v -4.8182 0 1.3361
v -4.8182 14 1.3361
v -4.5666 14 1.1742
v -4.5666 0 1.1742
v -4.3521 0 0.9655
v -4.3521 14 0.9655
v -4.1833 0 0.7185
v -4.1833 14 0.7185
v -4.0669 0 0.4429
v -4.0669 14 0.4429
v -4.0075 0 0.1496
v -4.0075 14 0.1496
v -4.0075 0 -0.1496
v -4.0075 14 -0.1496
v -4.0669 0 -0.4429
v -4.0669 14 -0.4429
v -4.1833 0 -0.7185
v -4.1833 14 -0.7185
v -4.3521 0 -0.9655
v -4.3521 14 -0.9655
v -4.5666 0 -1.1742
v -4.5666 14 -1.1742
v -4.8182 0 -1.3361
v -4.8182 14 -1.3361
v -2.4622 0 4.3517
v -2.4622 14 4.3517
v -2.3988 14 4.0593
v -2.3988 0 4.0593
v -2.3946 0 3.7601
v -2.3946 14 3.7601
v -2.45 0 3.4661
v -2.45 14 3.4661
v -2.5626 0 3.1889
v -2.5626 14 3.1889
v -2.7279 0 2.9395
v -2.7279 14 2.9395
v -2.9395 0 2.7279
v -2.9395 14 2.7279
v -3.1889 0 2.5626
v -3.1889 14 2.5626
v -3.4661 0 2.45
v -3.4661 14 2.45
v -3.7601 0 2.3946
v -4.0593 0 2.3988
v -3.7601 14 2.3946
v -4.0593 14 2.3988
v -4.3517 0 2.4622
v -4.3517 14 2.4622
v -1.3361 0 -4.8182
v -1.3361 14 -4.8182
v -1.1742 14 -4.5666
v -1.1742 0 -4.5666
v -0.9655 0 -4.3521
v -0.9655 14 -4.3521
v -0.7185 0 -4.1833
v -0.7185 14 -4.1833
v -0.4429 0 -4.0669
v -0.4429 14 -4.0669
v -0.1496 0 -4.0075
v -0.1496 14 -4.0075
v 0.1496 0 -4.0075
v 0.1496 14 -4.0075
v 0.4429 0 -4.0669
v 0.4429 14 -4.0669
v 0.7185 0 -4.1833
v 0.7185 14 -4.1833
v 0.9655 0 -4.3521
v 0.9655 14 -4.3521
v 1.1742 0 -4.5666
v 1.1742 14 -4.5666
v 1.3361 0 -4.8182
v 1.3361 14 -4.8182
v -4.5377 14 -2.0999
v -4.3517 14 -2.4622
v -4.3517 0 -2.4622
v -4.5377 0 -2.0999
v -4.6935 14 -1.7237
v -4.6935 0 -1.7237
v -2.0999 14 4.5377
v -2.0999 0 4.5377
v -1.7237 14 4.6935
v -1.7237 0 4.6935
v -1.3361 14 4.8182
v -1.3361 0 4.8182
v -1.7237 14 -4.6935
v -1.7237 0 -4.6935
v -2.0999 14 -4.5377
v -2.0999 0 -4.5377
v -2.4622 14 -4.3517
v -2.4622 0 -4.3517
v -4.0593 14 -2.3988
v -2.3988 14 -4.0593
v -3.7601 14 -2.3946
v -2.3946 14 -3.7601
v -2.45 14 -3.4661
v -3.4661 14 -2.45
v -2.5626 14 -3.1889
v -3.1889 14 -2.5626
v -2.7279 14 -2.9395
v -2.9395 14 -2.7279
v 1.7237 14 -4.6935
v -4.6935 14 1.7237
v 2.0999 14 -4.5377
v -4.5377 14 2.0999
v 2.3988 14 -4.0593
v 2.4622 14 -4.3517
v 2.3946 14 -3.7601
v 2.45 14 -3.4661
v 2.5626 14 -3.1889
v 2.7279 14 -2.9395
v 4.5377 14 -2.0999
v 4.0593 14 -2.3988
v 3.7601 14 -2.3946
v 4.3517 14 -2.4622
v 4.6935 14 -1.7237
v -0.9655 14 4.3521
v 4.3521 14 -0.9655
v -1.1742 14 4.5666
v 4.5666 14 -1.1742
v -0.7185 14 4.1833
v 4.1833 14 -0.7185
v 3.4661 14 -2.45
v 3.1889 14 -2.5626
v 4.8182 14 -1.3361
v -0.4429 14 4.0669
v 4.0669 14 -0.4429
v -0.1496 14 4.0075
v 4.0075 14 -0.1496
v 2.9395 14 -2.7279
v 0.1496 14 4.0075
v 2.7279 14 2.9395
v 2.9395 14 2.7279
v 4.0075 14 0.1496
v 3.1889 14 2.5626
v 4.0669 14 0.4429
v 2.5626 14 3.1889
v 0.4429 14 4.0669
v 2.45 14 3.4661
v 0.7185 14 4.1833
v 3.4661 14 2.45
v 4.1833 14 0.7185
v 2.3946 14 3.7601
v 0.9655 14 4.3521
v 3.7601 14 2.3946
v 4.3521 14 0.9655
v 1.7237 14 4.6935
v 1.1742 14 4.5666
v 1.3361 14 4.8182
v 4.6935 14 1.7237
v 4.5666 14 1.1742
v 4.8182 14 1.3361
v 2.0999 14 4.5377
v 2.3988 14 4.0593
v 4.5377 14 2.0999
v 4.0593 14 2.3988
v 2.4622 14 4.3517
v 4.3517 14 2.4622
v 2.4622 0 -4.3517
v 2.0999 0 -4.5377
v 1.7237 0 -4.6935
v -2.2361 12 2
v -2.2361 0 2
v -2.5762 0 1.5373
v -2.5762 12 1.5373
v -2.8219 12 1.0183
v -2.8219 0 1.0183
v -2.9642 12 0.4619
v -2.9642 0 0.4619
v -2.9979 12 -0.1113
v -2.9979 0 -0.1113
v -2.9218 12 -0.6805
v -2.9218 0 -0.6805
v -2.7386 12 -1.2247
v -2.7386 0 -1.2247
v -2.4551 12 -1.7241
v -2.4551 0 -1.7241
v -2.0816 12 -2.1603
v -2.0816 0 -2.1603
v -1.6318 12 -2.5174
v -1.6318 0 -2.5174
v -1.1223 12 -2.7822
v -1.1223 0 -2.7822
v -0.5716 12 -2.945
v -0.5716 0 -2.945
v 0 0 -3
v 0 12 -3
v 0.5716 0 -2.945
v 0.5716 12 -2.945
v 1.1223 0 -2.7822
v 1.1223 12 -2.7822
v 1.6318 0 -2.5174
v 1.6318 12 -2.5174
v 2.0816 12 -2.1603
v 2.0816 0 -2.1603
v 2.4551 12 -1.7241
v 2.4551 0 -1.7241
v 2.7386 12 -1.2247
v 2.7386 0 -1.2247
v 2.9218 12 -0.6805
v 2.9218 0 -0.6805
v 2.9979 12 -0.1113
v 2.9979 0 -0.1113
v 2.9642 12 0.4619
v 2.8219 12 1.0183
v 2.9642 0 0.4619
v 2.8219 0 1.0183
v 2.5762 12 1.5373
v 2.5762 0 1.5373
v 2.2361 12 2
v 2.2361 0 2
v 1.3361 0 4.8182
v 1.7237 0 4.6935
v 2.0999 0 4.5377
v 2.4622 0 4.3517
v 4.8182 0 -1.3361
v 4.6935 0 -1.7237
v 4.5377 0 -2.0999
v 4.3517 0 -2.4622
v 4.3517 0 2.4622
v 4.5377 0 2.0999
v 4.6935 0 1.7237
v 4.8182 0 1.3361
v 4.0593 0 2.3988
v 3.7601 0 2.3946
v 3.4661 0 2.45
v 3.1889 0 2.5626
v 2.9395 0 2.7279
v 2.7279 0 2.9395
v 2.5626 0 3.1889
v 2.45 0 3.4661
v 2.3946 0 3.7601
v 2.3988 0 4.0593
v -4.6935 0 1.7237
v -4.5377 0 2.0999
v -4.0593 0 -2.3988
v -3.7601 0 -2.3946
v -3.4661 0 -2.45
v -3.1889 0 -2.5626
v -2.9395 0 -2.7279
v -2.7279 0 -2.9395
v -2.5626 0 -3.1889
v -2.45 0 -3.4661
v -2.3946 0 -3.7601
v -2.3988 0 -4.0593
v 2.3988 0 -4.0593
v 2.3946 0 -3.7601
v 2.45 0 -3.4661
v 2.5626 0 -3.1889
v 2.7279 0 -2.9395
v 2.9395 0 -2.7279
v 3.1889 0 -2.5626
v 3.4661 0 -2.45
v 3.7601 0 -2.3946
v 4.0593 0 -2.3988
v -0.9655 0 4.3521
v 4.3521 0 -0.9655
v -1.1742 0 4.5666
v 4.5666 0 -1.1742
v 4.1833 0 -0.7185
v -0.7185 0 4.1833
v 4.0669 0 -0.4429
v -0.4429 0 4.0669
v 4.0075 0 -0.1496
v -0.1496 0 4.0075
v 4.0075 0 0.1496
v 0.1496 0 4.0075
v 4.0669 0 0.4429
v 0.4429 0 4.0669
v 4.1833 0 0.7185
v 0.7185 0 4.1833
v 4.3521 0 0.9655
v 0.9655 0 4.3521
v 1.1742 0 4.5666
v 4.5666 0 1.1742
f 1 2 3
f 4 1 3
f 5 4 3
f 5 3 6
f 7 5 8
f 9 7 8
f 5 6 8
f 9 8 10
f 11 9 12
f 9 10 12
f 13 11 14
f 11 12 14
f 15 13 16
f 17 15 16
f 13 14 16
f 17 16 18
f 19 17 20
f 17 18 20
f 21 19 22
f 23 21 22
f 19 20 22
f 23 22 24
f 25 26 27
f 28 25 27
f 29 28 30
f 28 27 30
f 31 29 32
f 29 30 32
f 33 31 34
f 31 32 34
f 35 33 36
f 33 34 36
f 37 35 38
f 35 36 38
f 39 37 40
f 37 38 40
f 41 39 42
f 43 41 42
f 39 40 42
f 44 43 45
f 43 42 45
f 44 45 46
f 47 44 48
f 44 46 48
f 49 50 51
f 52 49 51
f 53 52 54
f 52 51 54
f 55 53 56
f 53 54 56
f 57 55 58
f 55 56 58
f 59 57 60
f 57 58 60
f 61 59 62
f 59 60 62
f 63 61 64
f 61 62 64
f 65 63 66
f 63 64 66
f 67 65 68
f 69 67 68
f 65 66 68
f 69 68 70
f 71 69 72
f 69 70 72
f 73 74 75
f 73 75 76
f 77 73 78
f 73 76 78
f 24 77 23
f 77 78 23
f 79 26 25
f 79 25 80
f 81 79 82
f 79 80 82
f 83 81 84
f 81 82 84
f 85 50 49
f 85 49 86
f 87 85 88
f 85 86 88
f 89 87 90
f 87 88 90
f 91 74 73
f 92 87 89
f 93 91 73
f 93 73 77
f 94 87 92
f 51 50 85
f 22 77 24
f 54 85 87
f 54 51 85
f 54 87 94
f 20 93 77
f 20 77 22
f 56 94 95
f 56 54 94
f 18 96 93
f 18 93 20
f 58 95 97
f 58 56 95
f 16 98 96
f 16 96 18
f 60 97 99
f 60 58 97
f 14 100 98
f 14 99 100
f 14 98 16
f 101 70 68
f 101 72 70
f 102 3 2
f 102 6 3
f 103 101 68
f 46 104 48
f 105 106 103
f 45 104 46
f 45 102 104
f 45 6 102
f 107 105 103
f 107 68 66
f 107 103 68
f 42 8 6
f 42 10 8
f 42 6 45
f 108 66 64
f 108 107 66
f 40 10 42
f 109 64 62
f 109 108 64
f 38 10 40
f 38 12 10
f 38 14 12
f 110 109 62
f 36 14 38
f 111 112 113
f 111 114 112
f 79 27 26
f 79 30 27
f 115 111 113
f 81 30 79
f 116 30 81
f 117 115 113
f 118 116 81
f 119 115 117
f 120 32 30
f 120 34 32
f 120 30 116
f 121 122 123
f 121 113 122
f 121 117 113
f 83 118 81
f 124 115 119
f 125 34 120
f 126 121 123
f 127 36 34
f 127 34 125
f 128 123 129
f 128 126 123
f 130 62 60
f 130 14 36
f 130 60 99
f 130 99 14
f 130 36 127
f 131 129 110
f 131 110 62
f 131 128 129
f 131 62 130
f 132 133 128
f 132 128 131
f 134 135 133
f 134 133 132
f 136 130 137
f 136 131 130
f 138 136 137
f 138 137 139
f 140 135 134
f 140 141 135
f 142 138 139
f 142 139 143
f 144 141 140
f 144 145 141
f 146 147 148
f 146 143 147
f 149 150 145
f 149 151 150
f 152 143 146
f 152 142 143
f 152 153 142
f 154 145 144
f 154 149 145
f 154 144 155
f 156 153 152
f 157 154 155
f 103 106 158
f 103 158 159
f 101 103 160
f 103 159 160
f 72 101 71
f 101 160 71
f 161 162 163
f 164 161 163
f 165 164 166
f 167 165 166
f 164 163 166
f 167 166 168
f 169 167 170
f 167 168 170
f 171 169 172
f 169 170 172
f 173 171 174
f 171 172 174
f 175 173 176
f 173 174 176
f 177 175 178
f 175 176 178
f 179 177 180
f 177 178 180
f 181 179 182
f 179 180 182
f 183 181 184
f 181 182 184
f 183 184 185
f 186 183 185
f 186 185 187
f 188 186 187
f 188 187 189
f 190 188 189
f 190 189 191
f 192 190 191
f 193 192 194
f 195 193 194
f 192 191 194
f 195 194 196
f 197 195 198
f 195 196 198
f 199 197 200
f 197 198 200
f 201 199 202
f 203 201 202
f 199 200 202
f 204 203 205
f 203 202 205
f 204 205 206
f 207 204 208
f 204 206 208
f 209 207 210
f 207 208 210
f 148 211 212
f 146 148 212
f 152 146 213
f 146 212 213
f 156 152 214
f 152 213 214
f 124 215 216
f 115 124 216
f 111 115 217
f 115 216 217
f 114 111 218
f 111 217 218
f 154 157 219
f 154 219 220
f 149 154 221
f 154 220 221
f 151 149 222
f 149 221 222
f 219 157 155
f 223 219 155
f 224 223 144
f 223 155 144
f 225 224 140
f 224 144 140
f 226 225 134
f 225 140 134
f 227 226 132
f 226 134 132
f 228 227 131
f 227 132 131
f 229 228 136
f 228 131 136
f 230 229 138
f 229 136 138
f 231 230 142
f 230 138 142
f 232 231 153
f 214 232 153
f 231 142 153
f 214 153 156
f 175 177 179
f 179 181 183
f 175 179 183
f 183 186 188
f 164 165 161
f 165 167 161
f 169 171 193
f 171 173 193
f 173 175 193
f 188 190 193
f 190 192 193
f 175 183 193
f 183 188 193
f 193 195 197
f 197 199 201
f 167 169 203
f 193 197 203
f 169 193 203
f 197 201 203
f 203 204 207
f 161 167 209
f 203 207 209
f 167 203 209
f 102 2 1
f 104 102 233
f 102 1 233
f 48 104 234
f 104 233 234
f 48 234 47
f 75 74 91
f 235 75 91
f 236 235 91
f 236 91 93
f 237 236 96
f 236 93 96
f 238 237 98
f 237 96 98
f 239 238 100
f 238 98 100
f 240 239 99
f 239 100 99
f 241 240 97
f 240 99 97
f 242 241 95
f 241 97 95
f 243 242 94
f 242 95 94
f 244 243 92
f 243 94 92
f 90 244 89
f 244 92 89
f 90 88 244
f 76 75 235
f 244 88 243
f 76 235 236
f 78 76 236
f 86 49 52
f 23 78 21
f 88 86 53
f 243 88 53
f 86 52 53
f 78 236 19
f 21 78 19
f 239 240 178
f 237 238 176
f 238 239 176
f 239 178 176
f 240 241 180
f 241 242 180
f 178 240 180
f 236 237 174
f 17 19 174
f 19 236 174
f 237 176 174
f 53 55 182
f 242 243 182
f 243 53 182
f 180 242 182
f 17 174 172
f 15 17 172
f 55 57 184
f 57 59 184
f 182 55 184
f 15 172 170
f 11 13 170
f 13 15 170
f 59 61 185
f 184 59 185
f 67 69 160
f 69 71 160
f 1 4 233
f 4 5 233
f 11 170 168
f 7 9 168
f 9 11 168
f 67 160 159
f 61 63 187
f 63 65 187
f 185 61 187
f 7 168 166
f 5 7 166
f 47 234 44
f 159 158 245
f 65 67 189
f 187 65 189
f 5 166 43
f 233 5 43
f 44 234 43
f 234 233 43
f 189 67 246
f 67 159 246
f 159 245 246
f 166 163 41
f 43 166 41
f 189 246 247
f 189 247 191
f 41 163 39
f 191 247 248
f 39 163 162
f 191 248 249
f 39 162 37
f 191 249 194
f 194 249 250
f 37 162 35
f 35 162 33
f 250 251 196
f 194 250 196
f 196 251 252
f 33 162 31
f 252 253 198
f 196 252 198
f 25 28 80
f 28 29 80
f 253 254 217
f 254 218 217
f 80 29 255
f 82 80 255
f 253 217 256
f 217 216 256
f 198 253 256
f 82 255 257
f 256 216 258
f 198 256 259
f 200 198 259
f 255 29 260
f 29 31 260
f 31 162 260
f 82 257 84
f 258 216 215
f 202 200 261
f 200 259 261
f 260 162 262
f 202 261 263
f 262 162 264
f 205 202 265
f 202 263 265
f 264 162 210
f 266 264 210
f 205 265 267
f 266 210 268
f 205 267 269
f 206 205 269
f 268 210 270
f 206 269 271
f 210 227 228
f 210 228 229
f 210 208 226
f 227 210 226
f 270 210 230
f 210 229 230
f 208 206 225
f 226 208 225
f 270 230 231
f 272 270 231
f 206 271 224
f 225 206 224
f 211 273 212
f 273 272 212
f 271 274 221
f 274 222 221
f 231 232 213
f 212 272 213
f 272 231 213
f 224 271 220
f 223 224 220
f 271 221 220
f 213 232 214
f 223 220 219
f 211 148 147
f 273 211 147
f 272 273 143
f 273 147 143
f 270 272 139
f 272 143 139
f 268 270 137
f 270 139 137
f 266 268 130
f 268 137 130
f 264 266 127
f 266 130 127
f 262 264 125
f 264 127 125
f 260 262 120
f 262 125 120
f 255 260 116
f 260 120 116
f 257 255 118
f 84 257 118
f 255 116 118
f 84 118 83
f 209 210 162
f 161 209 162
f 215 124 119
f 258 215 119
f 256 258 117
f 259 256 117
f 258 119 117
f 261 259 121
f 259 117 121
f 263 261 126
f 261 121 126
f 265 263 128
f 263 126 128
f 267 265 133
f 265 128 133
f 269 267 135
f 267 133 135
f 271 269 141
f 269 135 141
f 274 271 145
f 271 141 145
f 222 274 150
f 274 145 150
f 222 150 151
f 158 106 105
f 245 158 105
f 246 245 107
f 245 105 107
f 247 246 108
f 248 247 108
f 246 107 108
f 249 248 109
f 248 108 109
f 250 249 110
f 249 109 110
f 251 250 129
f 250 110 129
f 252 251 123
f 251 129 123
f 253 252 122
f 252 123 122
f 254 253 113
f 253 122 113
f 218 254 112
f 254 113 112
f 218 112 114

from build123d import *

# Parameters (mm, degrees)
ESQUISSE1_R                  = 5
BOSS_EXTRU_1_DEPTH           = 12
ESQUISSE2_R                  = 5
BOSS_EXTRU_2_DEPTH           = 2
ESQUISSE3_R                  = 1.5
ENL_V_MAT_EXTRU_1_DEPTH      = 14
R_P_TITION_CIRCULAIRE1_COUNT = 8


with BuildPart() as part:
    # Esquisse1 → Boss.-Extru.1 (new body)
    with BuildSketch(Plane(origin=(0, 0, 0), x_dir=(1, 0, 0), z_dir=(0, 1, 0))):
        with Locations(Location((0, 0, 0), (0, 0, 270))):
            Circle(ESQUISSE1_R)
        with BuildLine():
            Line((2.236067977, -2), (-2.236067977, -2))
            ThreePointArc((-2.236067977, -2), (0, 3), (2.236067977, -2))
        make_face(mode=Mode.SUBTRACT)
    extrude(amount=BOSS_EXTRU_1_DEPTH)

    # Esquisse2 → Boss.-Extru.2 (add)
    with BuildSketch(Plane(origin=(0, 12, 0), x_dir=(1, 0, 0), z_dir=(0, 1, 0))):
        with Locations(Location((0, 0, 0), (0, 0, 270))):
            Circle(ESQUISSE2_R)
    extrude(amount=BOSS_EXTRU_2_DEPTH)

    # Esquisse3 → Enlèv. mat.-Extru.1 (cut)
    with BuildSketch(Plane(origin=(0, 14, 0), x_dir=(1, 0, 0), z_dir=(0, 1, 0))):
        with Locations((0, 5.5)):
            Circle(ESQUISSE3_R)
    enl_v_mat_extru_1 = extrude(amount=-ENL_V_MAT_EXTRU_1_DEPTH, mode=Mode.SUBTRACT)

    # Répétition circulaire1: Enlèv. mat.-Extru.1 ×8 about axis
    r_p_tition_circulaire1_axis = Axis((0, 0, 0), (0, 1, 0))
    for i in range(1, R_P_TITION_CIRCULAIRE1_COUNT):
        add(enl_v_mat_extru_1.rotate(r_p_tition_circulaire1_axis, i * 360 / R_P_TITION_CIRCULAIRE1_COUNT), mode=Mode.SUBTRACT)


solid = part.part
